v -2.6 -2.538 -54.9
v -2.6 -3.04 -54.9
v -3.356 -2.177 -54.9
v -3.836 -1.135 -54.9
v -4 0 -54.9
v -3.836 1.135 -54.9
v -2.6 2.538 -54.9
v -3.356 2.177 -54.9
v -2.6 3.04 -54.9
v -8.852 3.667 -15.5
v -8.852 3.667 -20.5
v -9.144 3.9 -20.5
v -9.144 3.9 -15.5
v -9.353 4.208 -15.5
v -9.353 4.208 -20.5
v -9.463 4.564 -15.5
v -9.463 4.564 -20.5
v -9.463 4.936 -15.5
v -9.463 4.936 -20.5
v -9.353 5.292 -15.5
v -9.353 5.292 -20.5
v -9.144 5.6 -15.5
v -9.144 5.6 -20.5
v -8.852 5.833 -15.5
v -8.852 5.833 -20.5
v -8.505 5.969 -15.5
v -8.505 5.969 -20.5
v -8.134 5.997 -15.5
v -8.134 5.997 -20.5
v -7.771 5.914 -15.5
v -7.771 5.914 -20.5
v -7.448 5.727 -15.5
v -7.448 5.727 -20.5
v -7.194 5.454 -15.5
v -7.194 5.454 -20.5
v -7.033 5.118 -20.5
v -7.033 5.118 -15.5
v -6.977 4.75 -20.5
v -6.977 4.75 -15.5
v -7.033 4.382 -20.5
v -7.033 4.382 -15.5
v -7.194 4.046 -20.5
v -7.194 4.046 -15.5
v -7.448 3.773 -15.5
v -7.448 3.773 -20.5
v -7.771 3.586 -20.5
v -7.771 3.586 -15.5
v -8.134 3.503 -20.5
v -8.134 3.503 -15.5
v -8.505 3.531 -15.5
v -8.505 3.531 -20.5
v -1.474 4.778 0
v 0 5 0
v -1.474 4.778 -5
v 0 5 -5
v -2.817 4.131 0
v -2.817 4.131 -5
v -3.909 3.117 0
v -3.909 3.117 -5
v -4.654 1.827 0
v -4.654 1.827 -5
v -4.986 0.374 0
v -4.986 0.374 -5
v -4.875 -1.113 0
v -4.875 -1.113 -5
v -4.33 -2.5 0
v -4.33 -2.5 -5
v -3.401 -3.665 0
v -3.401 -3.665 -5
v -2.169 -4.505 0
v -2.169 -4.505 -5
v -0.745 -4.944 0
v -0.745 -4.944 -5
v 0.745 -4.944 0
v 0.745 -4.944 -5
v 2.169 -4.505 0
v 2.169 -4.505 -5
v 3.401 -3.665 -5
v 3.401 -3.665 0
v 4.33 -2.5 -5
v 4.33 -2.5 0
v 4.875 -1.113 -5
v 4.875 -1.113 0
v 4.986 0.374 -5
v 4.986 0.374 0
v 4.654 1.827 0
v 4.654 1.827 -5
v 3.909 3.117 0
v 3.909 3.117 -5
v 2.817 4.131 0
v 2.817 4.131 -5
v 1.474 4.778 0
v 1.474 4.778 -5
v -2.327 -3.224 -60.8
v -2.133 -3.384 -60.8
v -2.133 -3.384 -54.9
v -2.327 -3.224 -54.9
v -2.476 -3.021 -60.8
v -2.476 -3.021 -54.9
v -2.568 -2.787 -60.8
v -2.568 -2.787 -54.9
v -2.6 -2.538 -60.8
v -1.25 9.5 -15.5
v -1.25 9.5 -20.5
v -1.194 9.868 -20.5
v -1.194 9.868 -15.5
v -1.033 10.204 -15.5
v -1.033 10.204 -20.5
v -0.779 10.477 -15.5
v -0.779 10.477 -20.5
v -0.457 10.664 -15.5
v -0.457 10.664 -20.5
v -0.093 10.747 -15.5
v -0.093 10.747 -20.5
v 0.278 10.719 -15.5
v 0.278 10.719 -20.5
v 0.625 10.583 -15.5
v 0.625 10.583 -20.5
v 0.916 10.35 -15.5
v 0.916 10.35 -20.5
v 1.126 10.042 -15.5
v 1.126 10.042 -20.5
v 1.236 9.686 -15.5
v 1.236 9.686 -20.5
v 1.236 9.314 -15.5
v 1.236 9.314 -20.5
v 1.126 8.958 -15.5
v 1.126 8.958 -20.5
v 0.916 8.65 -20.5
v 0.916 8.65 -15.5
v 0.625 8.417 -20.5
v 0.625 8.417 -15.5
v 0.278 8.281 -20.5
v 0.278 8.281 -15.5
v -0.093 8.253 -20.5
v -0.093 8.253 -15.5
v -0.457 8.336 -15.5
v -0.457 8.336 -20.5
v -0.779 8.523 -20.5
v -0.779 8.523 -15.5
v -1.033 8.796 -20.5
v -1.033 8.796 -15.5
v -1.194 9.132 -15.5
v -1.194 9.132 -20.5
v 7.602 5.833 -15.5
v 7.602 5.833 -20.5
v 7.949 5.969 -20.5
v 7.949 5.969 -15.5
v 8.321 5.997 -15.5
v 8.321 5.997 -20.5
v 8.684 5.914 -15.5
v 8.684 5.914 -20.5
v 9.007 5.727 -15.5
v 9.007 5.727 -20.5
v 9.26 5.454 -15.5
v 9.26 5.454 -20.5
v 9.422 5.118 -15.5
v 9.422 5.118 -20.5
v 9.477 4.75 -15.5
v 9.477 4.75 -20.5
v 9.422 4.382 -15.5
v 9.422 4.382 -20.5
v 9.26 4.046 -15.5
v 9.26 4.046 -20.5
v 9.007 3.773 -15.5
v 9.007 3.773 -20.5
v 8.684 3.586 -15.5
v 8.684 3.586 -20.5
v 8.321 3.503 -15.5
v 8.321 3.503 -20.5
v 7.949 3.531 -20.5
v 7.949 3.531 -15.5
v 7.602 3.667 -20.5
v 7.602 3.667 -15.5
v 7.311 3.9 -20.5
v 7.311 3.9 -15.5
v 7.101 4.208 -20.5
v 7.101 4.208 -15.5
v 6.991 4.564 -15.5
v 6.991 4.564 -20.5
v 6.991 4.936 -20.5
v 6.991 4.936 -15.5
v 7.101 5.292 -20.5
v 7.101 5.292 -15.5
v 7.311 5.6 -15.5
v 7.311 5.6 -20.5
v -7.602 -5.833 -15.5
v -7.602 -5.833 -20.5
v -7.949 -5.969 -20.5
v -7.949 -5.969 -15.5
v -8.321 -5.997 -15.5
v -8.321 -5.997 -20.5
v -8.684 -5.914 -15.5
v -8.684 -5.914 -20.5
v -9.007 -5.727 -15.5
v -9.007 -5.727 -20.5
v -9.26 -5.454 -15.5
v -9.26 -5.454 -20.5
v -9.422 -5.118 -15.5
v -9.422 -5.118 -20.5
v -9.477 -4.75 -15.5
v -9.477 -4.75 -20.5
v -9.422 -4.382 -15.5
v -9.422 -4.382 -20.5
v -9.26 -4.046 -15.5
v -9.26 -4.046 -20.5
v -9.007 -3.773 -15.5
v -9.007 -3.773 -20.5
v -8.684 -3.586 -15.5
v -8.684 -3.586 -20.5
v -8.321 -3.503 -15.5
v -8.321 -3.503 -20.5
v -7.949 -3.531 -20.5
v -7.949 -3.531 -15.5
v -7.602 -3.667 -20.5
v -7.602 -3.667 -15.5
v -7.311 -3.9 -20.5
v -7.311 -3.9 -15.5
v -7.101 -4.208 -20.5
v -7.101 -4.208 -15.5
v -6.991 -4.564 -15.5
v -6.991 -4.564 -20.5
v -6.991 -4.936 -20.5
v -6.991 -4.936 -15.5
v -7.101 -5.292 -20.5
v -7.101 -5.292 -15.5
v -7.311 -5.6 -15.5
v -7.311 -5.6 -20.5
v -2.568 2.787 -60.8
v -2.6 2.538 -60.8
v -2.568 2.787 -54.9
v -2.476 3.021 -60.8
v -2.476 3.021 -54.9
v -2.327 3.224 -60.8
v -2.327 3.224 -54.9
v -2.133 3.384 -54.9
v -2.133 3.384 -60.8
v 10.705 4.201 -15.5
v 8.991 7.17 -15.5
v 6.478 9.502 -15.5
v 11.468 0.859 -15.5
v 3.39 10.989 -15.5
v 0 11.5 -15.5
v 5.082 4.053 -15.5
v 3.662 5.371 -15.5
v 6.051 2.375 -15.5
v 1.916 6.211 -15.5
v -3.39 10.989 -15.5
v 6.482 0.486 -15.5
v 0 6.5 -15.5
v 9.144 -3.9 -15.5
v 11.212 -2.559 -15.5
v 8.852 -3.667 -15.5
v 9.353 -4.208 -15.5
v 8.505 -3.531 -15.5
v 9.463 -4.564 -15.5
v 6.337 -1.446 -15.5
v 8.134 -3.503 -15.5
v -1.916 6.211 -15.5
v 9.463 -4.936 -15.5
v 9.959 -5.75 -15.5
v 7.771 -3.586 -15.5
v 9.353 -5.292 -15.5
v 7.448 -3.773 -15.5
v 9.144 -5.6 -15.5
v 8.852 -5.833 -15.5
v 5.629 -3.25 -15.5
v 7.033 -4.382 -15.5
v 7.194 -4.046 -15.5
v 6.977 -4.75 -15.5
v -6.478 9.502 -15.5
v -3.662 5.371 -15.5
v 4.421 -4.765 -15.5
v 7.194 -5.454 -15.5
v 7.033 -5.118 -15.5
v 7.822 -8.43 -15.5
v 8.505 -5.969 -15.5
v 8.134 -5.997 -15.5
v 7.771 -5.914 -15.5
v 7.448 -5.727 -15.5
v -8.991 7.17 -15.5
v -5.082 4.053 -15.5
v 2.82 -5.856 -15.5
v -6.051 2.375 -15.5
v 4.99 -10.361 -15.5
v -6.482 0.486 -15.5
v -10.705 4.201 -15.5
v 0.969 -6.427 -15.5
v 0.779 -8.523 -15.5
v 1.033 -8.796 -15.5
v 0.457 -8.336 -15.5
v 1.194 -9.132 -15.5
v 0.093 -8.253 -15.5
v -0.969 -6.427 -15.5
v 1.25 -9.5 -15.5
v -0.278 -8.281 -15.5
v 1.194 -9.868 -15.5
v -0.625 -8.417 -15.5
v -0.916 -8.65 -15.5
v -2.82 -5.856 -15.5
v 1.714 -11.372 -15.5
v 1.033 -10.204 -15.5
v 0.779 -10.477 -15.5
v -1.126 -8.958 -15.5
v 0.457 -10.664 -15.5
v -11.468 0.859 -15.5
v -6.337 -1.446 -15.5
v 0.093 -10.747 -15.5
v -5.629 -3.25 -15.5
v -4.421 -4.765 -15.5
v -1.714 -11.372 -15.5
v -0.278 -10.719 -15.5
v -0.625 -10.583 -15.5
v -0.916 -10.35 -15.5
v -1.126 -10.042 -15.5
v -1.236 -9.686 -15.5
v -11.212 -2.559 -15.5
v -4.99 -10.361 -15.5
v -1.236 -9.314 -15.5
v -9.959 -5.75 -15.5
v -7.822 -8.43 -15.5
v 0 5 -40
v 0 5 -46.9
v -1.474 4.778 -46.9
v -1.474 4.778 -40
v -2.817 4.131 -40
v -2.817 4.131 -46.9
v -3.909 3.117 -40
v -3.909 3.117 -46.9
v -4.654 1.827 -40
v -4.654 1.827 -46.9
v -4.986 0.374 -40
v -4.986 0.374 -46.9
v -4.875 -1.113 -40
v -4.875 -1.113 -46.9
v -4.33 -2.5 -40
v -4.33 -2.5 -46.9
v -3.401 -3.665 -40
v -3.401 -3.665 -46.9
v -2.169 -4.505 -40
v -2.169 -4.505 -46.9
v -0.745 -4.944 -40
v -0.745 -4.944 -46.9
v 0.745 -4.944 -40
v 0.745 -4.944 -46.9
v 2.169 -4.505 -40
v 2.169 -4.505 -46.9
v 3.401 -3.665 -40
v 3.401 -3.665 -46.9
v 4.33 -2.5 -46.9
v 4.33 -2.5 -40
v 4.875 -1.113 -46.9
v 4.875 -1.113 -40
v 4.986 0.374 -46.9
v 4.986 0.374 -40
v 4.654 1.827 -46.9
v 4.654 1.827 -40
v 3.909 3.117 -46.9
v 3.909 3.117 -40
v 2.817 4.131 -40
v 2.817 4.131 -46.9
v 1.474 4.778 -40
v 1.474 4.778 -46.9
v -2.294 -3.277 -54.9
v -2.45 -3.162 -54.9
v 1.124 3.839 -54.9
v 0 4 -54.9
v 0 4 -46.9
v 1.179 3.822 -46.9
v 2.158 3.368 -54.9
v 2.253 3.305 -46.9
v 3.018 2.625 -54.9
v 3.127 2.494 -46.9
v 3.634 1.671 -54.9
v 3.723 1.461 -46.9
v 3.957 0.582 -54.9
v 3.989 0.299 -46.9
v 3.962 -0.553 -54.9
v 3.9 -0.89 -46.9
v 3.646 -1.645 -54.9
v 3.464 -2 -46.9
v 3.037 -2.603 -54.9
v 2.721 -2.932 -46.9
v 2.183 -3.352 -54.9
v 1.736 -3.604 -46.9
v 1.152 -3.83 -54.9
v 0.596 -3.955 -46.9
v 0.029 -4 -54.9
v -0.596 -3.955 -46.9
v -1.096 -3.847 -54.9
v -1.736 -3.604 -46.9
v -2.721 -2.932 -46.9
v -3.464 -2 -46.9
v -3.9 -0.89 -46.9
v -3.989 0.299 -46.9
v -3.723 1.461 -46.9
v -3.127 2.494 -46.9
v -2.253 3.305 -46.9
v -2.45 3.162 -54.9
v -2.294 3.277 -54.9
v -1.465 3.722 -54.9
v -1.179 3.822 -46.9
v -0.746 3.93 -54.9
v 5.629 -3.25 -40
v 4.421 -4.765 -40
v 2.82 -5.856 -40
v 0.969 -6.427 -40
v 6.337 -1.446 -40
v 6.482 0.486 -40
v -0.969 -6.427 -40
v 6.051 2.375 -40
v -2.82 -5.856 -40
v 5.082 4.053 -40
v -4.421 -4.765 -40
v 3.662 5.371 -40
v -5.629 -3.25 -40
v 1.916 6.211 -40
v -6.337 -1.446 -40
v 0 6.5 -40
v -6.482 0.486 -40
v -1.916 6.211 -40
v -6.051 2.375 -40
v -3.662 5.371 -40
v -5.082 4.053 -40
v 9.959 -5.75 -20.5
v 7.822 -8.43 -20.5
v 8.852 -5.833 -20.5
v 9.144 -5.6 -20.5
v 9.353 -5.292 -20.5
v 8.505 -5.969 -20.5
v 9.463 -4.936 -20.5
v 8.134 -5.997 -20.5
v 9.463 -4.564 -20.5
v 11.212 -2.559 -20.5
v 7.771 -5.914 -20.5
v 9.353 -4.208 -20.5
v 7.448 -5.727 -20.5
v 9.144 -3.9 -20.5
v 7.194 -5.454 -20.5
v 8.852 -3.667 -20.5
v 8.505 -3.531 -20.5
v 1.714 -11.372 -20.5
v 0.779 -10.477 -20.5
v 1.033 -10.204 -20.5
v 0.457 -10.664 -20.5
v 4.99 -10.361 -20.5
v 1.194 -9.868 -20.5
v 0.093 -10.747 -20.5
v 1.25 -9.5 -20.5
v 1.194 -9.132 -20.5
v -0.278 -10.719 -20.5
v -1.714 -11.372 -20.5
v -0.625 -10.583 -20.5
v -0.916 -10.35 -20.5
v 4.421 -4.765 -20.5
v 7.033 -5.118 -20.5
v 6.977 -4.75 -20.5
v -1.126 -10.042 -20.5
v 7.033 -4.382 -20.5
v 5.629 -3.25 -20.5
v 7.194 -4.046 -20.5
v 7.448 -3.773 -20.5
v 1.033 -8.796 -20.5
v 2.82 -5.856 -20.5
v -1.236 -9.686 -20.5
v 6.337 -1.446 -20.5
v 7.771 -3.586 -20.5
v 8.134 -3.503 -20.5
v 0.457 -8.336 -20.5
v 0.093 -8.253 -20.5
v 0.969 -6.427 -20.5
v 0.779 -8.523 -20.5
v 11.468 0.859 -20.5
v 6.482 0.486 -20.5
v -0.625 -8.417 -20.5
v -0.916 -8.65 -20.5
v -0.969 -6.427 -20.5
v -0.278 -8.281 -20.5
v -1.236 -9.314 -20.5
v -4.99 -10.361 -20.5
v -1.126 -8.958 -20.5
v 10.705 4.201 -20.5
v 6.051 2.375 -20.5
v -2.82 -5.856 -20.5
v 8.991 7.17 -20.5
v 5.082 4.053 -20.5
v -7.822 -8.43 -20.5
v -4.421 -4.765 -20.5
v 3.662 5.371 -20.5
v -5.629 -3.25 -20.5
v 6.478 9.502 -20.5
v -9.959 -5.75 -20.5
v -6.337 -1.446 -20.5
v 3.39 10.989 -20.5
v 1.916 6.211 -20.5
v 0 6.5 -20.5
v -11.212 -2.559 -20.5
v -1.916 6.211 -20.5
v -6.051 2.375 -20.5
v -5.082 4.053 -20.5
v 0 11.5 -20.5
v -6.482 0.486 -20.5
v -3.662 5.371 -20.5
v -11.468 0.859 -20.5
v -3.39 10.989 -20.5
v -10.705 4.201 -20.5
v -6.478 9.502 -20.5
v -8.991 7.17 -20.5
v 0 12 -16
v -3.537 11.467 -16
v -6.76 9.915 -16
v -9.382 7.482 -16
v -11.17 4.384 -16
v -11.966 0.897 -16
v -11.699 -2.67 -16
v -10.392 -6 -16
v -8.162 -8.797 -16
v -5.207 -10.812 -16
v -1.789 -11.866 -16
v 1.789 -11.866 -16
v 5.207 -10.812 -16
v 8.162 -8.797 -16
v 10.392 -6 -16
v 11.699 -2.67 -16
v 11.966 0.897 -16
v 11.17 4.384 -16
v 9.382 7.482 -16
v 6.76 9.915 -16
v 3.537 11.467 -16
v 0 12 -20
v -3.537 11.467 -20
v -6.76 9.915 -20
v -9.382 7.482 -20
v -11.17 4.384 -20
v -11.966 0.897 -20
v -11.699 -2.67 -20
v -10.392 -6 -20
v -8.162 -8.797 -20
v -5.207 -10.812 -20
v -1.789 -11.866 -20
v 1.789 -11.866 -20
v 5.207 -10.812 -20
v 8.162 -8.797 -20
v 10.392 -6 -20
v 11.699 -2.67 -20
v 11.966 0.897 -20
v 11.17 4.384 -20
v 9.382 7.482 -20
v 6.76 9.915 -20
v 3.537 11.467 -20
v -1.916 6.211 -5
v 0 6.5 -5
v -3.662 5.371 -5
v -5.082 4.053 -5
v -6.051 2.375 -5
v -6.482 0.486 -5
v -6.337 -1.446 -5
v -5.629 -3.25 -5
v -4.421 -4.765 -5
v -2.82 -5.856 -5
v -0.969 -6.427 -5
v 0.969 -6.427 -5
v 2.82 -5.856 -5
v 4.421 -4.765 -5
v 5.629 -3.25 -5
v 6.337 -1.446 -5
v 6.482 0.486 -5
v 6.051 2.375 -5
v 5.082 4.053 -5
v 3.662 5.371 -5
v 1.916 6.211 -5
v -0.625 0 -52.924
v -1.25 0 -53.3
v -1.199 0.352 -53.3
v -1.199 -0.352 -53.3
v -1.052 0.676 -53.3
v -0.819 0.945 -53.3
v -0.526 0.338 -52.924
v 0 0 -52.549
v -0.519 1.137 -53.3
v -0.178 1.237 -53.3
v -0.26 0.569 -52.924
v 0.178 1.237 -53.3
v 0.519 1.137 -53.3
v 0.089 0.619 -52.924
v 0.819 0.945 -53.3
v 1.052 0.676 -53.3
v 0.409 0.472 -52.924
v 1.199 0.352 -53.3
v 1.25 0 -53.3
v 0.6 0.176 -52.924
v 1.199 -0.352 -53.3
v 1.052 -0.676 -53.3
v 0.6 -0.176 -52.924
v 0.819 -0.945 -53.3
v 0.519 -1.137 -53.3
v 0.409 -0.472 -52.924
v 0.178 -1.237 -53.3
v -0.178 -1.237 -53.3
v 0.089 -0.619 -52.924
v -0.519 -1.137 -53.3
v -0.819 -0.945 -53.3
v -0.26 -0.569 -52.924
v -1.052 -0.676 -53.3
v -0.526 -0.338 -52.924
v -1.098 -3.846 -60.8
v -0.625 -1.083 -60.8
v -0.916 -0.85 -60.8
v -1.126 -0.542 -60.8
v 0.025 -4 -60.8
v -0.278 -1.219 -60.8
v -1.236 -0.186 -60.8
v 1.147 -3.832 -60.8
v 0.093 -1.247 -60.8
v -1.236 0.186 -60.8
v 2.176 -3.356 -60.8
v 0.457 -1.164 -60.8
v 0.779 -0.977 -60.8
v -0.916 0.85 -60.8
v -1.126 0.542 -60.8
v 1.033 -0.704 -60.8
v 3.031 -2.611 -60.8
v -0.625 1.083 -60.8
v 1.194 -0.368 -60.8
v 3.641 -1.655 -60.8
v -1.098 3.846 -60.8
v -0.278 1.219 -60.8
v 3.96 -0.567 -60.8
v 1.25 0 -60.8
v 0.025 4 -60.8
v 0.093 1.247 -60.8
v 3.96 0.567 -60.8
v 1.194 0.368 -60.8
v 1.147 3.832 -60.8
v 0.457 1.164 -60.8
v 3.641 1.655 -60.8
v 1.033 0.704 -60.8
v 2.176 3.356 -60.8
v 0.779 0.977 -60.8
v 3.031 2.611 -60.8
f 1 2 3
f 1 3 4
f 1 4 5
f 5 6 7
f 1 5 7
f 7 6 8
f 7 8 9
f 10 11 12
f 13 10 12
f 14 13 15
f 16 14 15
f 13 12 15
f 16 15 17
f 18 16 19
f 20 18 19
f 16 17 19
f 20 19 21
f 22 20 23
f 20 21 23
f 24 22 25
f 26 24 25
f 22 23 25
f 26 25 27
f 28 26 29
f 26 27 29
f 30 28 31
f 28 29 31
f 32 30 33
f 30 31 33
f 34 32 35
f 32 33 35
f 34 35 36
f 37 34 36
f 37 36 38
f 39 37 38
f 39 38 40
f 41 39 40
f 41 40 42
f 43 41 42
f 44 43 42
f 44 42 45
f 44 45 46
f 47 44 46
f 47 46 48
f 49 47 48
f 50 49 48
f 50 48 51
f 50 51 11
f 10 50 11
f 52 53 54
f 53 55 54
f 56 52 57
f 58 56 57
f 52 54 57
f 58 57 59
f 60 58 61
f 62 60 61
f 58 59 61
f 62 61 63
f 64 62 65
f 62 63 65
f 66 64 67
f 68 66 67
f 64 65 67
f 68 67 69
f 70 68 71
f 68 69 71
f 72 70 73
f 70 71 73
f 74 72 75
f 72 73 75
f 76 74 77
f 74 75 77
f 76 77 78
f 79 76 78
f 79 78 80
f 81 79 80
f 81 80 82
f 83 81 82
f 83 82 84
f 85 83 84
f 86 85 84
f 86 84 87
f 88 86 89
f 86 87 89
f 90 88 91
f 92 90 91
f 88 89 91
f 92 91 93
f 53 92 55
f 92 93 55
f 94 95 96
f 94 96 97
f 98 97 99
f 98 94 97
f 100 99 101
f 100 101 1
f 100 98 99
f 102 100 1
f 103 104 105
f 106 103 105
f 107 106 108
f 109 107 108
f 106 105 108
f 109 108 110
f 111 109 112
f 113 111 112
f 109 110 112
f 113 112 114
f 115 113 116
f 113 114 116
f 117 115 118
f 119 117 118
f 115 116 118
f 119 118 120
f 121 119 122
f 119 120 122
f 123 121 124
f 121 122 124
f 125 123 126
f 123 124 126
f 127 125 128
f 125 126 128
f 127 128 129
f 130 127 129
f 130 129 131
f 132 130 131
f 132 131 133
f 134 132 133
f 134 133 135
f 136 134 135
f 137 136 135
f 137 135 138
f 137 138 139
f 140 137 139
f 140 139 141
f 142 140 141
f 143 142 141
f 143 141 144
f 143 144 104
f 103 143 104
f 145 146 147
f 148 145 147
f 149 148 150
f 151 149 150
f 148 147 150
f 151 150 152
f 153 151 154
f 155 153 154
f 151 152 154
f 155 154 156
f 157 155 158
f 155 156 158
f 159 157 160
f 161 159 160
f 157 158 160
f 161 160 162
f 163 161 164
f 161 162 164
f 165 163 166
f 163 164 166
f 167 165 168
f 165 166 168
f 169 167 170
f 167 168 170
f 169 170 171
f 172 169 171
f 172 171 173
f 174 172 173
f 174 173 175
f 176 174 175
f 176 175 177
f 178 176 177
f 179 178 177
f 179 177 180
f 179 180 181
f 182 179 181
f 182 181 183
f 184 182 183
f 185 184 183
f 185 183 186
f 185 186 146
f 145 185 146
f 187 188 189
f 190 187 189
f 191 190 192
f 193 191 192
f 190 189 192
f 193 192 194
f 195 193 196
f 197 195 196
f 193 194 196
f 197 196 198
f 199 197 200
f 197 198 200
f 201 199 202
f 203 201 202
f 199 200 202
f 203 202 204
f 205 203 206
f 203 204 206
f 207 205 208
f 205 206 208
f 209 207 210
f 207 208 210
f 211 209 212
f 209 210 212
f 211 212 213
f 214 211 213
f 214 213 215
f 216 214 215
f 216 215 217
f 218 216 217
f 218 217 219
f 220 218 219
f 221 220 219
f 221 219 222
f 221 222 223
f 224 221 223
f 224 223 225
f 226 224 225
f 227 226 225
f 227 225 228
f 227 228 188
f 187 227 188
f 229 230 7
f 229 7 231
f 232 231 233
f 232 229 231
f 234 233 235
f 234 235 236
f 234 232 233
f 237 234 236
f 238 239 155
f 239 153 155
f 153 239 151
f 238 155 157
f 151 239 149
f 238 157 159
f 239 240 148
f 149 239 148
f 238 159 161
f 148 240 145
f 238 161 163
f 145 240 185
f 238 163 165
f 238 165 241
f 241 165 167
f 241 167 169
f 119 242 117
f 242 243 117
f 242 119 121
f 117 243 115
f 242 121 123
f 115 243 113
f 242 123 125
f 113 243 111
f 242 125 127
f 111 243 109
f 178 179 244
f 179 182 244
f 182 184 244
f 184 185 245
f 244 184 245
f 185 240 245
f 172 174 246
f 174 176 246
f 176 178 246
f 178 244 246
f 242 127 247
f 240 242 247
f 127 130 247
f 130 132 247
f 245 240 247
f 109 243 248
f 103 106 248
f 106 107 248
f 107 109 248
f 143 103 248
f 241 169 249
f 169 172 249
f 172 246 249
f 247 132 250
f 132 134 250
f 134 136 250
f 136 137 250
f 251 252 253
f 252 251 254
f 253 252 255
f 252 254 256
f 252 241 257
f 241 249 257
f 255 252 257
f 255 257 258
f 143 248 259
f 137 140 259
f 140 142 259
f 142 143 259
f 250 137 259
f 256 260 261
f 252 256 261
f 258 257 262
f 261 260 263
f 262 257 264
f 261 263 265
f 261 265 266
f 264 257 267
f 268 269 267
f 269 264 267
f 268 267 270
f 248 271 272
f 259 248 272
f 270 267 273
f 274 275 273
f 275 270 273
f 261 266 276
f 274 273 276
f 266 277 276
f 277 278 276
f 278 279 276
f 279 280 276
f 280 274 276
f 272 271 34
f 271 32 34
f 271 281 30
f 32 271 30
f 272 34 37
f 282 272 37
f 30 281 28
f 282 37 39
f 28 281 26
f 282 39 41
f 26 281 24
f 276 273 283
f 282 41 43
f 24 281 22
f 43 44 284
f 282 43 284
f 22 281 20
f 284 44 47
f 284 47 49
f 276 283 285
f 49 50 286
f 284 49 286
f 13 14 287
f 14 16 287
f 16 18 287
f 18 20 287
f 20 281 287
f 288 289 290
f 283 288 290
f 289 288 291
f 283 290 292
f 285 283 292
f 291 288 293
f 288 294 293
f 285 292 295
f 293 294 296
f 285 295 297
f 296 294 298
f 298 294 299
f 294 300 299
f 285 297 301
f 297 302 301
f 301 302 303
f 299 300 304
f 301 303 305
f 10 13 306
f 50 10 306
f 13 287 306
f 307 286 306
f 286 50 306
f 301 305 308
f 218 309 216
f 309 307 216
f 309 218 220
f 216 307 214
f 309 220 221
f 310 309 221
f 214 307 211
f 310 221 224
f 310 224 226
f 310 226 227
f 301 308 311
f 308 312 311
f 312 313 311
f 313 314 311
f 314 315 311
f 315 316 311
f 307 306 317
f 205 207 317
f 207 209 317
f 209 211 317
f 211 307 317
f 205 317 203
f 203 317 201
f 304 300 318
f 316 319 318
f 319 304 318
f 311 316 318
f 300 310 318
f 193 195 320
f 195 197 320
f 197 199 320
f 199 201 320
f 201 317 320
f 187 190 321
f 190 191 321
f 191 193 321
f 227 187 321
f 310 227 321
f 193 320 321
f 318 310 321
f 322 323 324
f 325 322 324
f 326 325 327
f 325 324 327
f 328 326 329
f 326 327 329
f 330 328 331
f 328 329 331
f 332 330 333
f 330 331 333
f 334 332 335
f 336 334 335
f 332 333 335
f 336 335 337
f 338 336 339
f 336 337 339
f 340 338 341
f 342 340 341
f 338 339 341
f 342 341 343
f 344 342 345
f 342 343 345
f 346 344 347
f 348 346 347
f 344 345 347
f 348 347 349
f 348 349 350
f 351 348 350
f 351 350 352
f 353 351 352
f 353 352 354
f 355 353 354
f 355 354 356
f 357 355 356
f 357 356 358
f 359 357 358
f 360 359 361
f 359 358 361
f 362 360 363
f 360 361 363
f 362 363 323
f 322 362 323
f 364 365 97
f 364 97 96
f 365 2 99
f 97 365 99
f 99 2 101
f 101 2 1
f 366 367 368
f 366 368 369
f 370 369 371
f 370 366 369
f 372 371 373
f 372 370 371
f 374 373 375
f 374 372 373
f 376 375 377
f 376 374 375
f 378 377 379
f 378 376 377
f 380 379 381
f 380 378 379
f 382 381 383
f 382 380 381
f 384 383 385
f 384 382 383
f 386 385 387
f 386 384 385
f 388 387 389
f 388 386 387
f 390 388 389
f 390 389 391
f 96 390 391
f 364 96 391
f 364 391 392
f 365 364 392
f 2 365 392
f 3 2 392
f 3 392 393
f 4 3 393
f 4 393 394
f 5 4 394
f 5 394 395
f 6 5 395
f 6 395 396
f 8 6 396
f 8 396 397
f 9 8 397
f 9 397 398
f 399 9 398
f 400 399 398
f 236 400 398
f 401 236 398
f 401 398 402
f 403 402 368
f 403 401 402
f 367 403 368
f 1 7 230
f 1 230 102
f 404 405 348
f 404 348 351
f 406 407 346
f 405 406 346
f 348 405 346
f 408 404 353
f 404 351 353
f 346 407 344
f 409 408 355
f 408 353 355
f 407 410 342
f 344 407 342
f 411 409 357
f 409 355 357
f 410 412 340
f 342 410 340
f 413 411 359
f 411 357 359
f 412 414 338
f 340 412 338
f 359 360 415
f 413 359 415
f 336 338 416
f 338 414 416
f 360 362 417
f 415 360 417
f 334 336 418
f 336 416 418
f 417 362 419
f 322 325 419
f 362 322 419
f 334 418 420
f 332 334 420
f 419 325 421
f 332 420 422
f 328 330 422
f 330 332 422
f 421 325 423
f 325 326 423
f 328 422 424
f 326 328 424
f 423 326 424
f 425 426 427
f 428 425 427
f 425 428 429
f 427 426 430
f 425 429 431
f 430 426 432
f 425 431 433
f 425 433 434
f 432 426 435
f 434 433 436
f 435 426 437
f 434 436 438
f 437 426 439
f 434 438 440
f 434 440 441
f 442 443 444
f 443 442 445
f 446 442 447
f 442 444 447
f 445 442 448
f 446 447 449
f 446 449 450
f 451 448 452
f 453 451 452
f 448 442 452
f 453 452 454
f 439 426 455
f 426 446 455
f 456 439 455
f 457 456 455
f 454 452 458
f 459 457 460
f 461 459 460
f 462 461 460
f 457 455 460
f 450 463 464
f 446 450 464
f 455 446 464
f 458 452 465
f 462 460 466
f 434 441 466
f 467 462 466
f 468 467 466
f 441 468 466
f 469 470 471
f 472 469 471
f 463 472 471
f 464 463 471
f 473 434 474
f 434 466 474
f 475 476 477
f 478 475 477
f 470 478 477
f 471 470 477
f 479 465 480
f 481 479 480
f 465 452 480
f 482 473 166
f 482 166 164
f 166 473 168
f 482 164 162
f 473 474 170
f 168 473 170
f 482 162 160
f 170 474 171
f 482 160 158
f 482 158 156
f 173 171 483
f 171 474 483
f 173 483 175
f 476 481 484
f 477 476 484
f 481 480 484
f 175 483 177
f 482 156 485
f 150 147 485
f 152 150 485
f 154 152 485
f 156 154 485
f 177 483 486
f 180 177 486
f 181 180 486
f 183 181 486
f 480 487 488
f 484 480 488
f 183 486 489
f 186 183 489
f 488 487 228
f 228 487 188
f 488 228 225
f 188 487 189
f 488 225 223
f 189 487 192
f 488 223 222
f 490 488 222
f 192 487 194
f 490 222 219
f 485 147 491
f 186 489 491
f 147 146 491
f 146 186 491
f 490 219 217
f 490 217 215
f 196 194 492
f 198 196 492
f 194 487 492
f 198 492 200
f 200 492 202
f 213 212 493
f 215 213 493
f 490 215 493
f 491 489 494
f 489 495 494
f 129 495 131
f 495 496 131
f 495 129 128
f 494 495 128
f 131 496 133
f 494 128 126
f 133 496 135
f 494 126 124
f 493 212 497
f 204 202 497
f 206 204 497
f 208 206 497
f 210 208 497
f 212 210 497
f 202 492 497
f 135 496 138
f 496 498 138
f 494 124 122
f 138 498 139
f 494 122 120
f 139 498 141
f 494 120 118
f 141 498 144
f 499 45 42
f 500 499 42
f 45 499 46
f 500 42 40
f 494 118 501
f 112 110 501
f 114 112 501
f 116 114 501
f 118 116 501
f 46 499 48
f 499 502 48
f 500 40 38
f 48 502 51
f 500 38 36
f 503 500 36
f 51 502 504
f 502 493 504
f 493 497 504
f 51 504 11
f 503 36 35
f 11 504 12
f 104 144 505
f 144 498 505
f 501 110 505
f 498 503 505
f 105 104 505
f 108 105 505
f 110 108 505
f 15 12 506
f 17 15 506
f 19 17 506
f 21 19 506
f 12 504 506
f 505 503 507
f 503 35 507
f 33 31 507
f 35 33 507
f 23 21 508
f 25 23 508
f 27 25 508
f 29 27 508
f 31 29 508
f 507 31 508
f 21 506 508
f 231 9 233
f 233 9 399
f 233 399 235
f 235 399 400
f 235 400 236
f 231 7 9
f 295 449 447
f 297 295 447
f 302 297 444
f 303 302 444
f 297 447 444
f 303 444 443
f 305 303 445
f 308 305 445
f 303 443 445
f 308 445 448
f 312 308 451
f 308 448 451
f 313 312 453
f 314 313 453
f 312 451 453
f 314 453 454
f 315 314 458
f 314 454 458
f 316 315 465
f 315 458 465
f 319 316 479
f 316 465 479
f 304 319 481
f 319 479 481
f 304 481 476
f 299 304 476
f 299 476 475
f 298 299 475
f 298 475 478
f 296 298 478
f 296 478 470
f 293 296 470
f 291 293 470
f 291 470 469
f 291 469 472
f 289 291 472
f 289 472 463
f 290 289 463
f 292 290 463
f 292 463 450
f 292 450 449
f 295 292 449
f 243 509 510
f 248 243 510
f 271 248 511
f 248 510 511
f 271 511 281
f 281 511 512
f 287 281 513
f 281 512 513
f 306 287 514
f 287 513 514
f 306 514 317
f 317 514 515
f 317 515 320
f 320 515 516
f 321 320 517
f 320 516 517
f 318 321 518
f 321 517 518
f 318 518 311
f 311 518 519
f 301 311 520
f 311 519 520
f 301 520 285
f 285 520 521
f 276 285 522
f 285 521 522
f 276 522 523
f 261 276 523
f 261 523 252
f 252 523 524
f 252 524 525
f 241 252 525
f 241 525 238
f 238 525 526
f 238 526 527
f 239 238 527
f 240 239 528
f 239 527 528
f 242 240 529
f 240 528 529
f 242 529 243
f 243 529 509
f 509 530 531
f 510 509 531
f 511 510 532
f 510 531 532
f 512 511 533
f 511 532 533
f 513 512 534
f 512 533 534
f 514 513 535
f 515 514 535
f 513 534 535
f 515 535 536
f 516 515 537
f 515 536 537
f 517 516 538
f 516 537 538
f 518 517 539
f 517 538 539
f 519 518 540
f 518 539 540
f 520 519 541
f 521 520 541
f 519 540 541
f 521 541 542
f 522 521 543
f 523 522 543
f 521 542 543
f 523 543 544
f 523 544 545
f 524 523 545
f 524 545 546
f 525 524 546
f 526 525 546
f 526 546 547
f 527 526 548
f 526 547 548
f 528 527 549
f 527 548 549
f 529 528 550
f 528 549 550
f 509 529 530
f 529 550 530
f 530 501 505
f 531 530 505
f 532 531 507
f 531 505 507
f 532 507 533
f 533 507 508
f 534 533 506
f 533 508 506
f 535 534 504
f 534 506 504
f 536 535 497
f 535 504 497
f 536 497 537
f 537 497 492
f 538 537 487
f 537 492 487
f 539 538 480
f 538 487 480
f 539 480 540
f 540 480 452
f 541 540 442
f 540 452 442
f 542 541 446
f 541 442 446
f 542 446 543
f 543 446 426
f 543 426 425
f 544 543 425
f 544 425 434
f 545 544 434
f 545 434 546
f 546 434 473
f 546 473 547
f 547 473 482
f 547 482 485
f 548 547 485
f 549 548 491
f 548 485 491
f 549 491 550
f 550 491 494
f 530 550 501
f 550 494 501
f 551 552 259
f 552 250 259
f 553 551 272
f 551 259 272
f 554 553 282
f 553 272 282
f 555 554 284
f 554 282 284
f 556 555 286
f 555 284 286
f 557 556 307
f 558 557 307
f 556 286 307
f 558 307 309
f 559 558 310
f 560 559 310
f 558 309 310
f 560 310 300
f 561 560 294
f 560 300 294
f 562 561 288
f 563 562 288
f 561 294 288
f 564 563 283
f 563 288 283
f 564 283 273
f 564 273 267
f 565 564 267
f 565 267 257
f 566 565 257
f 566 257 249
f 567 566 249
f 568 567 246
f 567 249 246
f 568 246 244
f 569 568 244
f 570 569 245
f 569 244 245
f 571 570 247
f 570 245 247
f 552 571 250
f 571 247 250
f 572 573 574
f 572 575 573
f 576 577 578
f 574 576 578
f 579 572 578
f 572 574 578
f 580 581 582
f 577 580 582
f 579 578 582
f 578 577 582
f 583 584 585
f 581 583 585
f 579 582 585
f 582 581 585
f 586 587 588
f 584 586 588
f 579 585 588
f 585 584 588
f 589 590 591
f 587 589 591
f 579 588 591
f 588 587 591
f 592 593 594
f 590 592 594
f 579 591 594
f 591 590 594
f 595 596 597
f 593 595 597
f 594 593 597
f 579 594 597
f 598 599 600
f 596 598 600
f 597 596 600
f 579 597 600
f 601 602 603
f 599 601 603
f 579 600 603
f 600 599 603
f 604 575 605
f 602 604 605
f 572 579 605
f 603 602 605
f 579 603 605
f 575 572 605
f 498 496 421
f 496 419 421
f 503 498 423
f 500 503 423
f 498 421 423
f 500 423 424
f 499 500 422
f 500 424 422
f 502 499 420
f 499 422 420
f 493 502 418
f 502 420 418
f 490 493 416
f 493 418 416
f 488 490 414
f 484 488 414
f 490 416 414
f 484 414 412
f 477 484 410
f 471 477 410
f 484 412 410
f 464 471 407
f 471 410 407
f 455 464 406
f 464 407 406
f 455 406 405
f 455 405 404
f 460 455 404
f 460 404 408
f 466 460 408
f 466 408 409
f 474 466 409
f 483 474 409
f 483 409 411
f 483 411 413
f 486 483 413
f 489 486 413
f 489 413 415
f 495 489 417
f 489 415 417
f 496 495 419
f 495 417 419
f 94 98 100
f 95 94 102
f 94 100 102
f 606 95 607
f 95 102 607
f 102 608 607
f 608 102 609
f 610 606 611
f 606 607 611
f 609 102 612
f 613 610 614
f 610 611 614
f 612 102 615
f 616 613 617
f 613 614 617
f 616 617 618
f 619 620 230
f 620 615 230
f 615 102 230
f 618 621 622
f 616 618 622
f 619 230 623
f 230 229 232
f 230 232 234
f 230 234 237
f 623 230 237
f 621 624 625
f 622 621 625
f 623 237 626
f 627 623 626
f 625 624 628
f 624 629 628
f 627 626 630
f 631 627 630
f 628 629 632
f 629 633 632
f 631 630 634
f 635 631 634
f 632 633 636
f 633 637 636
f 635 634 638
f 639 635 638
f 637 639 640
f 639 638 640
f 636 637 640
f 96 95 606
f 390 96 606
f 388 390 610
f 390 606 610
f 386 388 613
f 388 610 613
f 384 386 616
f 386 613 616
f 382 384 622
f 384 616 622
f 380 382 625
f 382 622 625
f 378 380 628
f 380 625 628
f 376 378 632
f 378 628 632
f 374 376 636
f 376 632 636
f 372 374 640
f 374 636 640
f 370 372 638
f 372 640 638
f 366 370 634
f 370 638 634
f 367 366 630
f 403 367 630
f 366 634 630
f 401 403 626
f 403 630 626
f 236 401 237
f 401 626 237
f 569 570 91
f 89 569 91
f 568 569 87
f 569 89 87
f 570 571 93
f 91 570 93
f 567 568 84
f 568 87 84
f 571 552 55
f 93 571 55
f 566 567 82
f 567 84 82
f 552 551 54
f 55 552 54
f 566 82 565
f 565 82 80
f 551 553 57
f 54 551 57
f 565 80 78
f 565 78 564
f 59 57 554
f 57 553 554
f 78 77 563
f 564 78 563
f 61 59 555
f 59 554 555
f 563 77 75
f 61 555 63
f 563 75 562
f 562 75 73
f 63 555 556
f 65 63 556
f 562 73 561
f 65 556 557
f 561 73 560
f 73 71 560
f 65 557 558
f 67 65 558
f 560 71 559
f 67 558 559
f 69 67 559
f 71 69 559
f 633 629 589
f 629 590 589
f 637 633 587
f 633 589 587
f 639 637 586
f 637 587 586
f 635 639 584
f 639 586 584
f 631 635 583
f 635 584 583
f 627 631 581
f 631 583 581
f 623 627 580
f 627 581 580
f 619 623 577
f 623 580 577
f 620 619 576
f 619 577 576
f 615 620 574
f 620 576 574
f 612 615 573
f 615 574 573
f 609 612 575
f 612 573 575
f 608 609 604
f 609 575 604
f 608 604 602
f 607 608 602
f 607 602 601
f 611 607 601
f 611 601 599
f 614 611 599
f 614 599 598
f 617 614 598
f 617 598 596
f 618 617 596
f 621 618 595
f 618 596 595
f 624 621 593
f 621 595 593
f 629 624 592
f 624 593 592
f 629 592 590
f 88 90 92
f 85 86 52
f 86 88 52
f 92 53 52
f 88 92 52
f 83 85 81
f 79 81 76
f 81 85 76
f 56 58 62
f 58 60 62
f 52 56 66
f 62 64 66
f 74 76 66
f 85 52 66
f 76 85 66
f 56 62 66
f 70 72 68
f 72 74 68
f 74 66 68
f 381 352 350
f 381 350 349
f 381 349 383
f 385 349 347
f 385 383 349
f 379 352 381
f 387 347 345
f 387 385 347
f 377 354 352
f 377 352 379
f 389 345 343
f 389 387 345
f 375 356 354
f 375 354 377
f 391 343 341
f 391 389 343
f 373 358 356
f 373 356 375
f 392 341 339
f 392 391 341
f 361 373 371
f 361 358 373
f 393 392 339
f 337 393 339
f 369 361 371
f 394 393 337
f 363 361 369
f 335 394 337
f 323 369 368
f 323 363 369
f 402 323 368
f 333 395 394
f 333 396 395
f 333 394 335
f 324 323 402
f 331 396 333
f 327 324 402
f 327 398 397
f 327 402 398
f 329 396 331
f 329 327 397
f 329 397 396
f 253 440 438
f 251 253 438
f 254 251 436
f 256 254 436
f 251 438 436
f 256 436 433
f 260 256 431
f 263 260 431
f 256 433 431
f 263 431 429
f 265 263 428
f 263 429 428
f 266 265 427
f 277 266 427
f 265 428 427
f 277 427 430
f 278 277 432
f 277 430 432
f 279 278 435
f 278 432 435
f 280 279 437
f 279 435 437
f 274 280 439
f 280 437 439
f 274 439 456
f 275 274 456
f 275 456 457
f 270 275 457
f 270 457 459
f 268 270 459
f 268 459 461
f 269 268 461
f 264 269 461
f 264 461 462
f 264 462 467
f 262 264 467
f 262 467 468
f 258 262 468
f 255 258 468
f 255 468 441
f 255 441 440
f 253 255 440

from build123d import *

# Parameters (mm, degrees)
HOLE_WIZARD_M3_1_D       = 2.5
PATTERN_CIRCULAR_1_COUNT = 6
CHAMFER_1_SIZE           = 0.5
SKETCH_5_OUTSIDE_W       = 38.908
SKETCH_5_OUTSIDE_H       = 38.908
SKETCH_5_OUTSIDE_R       = 4
CUT_EXTRUDE_1_DEPTH      = 8
EXTRUDE_START            = 5.9
EXTRUDE_1_DEPTH          = 5.9
HOLE_WIZARD_M3_2_D       = 2.5
HOLE_WIZARD_M3_2_DEPTH   = 7.5
HOLE_WIZARD_M3_2_TIP     = 0.7510757737844503
FILLET_1_R               = 1


with BuildPart() as part:
    # 草图1 → 旋转1 (revolve)
    with BuildSketch(Plane(origin=(0, 0, 0), x_dir=(0, 0, -1), z_dir=(1, 0, 0))):
        Polygon((0, 0), (0, 4.999999999999993), (5, 4.999999999999994), (5, 6.499999999999994), (15.5, 6.499999999999994), (15.5, 11.999999999999995), (20.5, 11.999999999999995), (20.5, 6.499999999999994), (40, 6.499999999999994), (40, 4.999999999999993), (54.900000000000006, 4.999999999999993), (54.900000000000006, 6.85e-15), align=None)
    revolve(axis=Axis((0, 6.85e-15, -54.900000000000006), (0, -1.2e-16, 1)))

    # M3 螺纹孔1 (through all)
    with Locations(Plane.XY.offset(-15.5)):
        with Locations((0, 9.5)):
            hole_wizard_m3_1 = Hole(HOLE_WIZARD_M3_1_D / 2)

    # 阵列(圆周)1: M3 螺纹孔1 ×6 about axis
    pattern_circular_1_axis = Axis((0, 6.85e-15, -54.900000000000006), (0, 1.2e-16, -1))
    for i in range(1, PATTERN_CIRCULAR_1_COUNT):
        add(hole_wizard_m3_1.rotate(pattern_circular_1_axis, i * 360 / PATTERN_CIRCULAR_1_COUNT), mode=Mode.SUBTRACT)

    # 倒角1
    chamfer_1_edges = [part.edges().sort_by_distance(p)[0] for p in [
        (-1.47e-15, -11.999999999999991, -15.500000000000002),
        (-1.47e-15, -11.999999999999991, -20.5),
    ]]
    chamfer(chamfer_1_edges, length=CHAMFER_1_SIZE)

    # 草图5 outside → 切除-拉伸1 (cut)
    with BuildSketch(Plane(origin=(0, 6.85e-15, -54.900000000000006), x_dir=(-1, 0, 0), z_dir=(0, 1.3e-16, -1))):
        Rectangle(SKETCH_5_OUTSIDE_W, SKETCH_5_OUTSIDE_H)
        Circle(SKETCH_5_OUTSIDE_R, mode=Mode.SUBTRACT)
    extrude(amount=-CUT_EXTRUDE_1_DEPTH, mode=Mode.SUBTRACT)

    # 草图6 → 凸台-拉伸1 (add)
    with BuildSketch(Plane(origin=(0, 6.85e-15, -54.900000000000006), x_dir=(-1, 0, 0), z_dir=(0, 1.2e-16, -1)).offset(EXTRUDE_START)):
        with BuildLine():
            Line((2.6000000000000005, 3.0397368307141326), (2.6000000000000005, -3.0397368307141326))
            ThreePointArc((2.6000000000000005, -3.0397368307141326), (-4, 4.9e-16), (2.6000000000000005, 3.0397368307141326))
        make_face()
    extrude(amount=-EXTRUDE_1_DEPTH)

    # M3 螺纹孔2
    with Locations(Plane(origin=(0, 7.58e-15, -60.800000000000004), x_dir=(-1, 0, 0), z_dir=(0, 1.2e-16, -1))):
        with Locations((0, 0)):
            Hole(HOLE_WIZARD_M3_2_D / 2, depth=HOLE_WIZARD_M3_2_DEPTH)
            with Locations((0, 0, -(HOLE_WIZARD_M3_2_DEPTH + HOLE_WIZARD_M3_2_TIP / 2))):  # 118° drill point
                Cone(0, HOLE_WIZARD_M3_2_D / 2, HOLE_WIZARD_M3_2_TIP, mode=Mode.SUBTRACT)

    # 圆角1
    fillet_1_edges = [part.edges().sort_by_distance(p)[0] for p in [
        (-2.6000000000000005, -3.0397368307141255, -57.85),
        (-2.6, 3.03973683071414, -57.85),
    ]]
    fillet(fillet_1_edges, radius=FILLET_1_R)


solid = part.part
